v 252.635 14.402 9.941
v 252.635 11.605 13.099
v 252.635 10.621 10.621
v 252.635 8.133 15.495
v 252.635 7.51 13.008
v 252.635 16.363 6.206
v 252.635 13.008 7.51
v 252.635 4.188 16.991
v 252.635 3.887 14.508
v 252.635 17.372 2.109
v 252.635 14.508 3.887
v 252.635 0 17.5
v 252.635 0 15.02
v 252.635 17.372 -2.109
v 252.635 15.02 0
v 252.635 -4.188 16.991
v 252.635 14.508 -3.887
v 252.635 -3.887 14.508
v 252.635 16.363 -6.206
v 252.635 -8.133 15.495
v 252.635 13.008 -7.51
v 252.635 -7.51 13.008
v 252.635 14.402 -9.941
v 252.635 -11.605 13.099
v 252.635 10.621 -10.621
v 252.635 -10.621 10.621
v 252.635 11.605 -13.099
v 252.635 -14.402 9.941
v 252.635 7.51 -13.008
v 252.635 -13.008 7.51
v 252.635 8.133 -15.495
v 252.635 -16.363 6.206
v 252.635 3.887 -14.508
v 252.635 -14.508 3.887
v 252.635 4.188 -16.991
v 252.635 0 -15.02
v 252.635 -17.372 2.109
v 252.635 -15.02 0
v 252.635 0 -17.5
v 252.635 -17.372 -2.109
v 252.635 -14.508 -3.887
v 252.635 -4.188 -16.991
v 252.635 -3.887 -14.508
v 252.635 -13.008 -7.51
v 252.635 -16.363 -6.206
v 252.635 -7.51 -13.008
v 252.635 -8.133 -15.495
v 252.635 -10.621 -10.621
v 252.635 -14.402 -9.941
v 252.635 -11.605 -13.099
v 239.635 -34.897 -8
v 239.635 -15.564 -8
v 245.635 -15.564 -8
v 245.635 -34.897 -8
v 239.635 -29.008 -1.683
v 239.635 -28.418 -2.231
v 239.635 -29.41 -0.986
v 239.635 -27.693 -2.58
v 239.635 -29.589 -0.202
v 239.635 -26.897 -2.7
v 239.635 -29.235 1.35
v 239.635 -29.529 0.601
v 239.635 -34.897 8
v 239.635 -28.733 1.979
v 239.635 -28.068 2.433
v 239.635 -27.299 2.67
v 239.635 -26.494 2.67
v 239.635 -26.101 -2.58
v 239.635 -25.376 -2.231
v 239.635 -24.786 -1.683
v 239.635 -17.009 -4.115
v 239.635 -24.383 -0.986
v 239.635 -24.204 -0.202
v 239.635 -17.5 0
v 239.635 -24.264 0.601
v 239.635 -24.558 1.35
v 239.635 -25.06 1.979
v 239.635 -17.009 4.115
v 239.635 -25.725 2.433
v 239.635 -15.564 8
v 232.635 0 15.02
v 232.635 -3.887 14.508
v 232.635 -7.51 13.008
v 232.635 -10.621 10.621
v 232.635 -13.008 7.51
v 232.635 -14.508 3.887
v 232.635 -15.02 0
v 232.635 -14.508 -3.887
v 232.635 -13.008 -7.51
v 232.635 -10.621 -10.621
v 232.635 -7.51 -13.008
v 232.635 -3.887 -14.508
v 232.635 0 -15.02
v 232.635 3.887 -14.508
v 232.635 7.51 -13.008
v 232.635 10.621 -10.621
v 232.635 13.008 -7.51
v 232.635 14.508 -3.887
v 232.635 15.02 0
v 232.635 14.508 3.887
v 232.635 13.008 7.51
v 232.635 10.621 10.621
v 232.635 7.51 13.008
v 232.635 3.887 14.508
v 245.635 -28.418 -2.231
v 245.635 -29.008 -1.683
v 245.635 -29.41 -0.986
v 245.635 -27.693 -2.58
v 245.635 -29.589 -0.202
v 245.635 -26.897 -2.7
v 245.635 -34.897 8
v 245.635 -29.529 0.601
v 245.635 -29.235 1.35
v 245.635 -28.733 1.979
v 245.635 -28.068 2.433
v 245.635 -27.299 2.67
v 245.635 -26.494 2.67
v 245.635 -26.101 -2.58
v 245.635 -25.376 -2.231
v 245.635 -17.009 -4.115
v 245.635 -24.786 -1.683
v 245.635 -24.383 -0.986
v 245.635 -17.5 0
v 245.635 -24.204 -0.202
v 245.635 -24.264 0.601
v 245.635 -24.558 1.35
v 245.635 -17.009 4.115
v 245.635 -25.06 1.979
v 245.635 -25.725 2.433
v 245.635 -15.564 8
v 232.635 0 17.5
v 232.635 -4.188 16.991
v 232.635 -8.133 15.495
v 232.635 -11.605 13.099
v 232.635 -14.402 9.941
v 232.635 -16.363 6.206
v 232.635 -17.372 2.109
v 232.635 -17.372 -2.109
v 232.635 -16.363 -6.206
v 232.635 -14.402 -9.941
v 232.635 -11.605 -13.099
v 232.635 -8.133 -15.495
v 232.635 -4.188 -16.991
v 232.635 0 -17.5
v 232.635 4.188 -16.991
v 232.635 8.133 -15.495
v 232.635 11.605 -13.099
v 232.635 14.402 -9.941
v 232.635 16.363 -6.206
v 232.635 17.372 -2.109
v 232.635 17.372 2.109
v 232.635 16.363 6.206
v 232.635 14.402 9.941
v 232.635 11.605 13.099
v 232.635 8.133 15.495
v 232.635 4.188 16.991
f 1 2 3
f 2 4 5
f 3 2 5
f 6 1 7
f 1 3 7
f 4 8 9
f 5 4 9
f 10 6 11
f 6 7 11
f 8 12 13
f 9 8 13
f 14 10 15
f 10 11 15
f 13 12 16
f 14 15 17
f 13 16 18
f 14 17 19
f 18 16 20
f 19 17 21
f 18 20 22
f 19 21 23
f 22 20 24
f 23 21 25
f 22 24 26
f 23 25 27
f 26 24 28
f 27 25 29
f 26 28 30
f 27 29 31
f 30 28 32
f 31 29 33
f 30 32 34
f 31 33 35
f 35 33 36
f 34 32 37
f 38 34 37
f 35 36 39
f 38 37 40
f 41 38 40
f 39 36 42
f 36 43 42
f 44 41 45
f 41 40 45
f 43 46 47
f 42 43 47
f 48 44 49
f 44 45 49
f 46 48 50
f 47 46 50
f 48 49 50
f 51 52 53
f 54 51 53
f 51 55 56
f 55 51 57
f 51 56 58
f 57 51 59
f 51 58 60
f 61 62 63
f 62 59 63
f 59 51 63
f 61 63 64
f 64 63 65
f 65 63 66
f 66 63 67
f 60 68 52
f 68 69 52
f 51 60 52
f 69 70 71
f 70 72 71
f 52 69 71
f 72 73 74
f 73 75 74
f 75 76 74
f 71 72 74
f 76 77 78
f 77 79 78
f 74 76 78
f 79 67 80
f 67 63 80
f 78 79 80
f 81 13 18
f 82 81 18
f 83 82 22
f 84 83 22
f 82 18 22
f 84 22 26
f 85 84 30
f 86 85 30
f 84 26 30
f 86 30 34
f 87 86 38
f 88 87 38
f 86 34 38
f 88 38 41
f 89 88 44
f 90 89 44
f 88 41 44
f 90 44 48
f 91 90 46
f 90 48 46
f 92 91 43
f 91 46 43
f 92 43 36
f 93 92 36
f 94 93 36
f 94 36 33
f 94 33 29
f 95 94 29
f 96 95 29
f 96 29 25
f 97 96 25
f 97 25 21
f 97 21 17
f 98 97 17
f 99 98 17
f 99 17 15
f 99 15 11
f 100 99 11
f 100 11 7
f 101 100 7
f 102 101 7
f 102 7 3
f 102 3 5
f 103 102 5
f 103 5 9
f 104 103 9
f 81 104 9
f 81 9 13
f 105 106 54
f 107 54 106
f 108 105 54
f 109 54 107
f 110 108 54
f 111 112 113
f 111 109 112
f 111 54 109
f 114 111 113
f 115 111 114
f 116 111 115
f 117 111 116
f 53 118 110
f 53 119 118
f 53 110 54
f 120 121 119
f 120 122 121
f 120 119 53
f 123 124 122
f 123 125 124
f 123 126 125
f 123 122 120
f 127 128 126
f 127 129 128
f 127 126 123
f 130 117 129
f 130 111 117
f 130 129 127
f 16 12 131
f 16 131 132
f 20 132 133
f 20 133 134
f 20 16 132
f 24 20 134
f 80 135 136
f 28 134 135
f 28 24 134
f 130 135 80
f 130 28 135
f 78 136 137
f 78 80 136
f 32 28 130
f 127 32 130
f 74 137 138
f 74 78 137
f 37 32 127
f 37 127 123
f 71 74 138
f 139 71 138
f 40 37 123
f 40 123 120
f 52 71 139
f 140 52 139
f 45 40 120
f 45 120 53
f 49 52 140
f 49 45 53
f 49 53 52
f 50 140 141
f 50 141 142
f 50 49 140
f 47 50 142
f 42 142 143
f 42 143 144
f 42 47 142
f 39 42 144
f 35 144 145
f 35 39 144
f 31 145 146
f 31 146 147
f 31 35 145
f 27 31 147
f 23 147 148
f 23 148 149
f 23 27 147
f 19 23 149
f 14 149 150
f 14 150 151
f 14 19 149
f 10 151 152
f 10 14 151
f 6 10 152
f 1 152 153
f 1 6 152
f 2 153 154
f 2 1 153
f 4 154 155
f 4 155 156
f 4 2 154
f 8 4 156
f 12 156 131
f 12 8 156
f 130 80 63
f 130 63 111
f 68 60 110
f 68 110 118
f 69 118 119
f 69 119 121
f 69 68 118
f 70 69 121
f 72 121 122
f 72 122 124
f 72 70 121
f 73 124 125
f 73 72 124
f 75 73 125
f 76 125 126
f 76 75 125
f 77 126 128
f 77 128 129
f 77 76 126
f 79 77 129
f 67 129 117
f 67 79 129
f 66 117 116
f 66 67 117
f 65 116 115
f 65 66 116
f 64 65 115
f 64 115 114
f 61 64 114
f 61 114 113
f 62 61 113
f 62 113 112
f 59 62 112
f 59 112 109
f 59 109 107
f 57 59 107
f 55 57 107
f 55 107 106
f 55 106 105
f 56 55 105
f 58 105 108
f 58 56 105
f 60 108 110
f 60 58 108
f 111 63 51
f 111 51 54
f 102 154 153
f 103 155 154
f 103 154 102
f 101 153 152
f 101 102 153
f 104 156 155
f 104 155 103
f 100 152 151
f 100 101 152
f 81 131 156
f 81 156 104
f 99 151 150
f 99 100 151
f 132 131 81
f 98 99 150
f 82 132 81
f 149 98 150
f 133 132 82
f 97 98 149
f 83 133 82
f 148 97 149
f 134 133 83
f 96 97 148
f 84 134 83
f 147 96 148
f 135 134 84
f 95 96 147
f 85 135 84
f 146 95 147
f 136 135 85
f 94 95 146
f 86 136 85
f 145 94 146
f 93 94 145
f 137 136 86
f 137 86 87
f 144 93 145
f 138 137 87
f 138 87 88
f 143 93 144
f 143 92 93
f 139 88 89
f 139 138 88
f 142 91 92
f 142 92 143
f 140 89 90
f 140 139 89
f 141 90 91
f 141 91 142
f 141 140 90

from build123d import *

# Parameters (mm, degrees)
COLLAR_SKETCH_W         = 20
COLLAR_SKETCH_H         = 2.48
TAB_SKETCH_W            = 6
TAB_SKETCH_H            = 26.896697694
TAB_DEPTH               = 8
TUBE_CLEARANCE_SKETCH_W = 8
TUBE_CLEARANCE_SKETCH_H = 15.02
PIN_HOLE_SKETCH_R       = 2.7
PIN_HOLE_DEPTH          = 6


with BuildPart() as part:
    # Collar Sketch → Collar (revolve)
    with BuildSketch(Plane.XY):
        with Locations((242.635235803, 16.26)):
            Rectangle(COLLAR_SKETCH_W, COLLAR_SKETCH_H)
    revolve(axis=Axis((-3000, 0, 0), (1, 0, 0)))

    # Tab Sketch → Tab (add, symmetric)
    with BuildSketch(Plane.XY):
        with Locations((242.635235803, -21.448348847)):
            Rectangle(TAB_SKETCH_W, TAB_SKETCH_H)
    extrude(amount=TAB_DEPTH, both=True)

    # Tube Clearance Sketch → Tube Clearance (revolve, cut)
    with BuildSketch(Plane.XY):
        with Locations((242.635235803, 7.51)):
            Rectangle(TUBE_CLEARANCE_SKETCH_W, TUBE_CLEARANCE_SKETCH_H)
    revolve(axis=Axis((-3000, 0, 0), (1, 0, 0)), mode=Mode.SUBTRACT)

    # Pin Hole Sketch → Pin Hole (cut)
    with BuildSketch(Plane(origin=(239.635235803, 0, 0), x_dir=(0, 0, -1), z_dir=(1, 0, 0))):
        with Locations((0, -26.896697694)):
            Circle(PIN_HOLE_SKETCH_R)
    extrude(amount=PIN_HOLE_DEPTH, mode=Mode.SUBTRACT)


solid = part.part
